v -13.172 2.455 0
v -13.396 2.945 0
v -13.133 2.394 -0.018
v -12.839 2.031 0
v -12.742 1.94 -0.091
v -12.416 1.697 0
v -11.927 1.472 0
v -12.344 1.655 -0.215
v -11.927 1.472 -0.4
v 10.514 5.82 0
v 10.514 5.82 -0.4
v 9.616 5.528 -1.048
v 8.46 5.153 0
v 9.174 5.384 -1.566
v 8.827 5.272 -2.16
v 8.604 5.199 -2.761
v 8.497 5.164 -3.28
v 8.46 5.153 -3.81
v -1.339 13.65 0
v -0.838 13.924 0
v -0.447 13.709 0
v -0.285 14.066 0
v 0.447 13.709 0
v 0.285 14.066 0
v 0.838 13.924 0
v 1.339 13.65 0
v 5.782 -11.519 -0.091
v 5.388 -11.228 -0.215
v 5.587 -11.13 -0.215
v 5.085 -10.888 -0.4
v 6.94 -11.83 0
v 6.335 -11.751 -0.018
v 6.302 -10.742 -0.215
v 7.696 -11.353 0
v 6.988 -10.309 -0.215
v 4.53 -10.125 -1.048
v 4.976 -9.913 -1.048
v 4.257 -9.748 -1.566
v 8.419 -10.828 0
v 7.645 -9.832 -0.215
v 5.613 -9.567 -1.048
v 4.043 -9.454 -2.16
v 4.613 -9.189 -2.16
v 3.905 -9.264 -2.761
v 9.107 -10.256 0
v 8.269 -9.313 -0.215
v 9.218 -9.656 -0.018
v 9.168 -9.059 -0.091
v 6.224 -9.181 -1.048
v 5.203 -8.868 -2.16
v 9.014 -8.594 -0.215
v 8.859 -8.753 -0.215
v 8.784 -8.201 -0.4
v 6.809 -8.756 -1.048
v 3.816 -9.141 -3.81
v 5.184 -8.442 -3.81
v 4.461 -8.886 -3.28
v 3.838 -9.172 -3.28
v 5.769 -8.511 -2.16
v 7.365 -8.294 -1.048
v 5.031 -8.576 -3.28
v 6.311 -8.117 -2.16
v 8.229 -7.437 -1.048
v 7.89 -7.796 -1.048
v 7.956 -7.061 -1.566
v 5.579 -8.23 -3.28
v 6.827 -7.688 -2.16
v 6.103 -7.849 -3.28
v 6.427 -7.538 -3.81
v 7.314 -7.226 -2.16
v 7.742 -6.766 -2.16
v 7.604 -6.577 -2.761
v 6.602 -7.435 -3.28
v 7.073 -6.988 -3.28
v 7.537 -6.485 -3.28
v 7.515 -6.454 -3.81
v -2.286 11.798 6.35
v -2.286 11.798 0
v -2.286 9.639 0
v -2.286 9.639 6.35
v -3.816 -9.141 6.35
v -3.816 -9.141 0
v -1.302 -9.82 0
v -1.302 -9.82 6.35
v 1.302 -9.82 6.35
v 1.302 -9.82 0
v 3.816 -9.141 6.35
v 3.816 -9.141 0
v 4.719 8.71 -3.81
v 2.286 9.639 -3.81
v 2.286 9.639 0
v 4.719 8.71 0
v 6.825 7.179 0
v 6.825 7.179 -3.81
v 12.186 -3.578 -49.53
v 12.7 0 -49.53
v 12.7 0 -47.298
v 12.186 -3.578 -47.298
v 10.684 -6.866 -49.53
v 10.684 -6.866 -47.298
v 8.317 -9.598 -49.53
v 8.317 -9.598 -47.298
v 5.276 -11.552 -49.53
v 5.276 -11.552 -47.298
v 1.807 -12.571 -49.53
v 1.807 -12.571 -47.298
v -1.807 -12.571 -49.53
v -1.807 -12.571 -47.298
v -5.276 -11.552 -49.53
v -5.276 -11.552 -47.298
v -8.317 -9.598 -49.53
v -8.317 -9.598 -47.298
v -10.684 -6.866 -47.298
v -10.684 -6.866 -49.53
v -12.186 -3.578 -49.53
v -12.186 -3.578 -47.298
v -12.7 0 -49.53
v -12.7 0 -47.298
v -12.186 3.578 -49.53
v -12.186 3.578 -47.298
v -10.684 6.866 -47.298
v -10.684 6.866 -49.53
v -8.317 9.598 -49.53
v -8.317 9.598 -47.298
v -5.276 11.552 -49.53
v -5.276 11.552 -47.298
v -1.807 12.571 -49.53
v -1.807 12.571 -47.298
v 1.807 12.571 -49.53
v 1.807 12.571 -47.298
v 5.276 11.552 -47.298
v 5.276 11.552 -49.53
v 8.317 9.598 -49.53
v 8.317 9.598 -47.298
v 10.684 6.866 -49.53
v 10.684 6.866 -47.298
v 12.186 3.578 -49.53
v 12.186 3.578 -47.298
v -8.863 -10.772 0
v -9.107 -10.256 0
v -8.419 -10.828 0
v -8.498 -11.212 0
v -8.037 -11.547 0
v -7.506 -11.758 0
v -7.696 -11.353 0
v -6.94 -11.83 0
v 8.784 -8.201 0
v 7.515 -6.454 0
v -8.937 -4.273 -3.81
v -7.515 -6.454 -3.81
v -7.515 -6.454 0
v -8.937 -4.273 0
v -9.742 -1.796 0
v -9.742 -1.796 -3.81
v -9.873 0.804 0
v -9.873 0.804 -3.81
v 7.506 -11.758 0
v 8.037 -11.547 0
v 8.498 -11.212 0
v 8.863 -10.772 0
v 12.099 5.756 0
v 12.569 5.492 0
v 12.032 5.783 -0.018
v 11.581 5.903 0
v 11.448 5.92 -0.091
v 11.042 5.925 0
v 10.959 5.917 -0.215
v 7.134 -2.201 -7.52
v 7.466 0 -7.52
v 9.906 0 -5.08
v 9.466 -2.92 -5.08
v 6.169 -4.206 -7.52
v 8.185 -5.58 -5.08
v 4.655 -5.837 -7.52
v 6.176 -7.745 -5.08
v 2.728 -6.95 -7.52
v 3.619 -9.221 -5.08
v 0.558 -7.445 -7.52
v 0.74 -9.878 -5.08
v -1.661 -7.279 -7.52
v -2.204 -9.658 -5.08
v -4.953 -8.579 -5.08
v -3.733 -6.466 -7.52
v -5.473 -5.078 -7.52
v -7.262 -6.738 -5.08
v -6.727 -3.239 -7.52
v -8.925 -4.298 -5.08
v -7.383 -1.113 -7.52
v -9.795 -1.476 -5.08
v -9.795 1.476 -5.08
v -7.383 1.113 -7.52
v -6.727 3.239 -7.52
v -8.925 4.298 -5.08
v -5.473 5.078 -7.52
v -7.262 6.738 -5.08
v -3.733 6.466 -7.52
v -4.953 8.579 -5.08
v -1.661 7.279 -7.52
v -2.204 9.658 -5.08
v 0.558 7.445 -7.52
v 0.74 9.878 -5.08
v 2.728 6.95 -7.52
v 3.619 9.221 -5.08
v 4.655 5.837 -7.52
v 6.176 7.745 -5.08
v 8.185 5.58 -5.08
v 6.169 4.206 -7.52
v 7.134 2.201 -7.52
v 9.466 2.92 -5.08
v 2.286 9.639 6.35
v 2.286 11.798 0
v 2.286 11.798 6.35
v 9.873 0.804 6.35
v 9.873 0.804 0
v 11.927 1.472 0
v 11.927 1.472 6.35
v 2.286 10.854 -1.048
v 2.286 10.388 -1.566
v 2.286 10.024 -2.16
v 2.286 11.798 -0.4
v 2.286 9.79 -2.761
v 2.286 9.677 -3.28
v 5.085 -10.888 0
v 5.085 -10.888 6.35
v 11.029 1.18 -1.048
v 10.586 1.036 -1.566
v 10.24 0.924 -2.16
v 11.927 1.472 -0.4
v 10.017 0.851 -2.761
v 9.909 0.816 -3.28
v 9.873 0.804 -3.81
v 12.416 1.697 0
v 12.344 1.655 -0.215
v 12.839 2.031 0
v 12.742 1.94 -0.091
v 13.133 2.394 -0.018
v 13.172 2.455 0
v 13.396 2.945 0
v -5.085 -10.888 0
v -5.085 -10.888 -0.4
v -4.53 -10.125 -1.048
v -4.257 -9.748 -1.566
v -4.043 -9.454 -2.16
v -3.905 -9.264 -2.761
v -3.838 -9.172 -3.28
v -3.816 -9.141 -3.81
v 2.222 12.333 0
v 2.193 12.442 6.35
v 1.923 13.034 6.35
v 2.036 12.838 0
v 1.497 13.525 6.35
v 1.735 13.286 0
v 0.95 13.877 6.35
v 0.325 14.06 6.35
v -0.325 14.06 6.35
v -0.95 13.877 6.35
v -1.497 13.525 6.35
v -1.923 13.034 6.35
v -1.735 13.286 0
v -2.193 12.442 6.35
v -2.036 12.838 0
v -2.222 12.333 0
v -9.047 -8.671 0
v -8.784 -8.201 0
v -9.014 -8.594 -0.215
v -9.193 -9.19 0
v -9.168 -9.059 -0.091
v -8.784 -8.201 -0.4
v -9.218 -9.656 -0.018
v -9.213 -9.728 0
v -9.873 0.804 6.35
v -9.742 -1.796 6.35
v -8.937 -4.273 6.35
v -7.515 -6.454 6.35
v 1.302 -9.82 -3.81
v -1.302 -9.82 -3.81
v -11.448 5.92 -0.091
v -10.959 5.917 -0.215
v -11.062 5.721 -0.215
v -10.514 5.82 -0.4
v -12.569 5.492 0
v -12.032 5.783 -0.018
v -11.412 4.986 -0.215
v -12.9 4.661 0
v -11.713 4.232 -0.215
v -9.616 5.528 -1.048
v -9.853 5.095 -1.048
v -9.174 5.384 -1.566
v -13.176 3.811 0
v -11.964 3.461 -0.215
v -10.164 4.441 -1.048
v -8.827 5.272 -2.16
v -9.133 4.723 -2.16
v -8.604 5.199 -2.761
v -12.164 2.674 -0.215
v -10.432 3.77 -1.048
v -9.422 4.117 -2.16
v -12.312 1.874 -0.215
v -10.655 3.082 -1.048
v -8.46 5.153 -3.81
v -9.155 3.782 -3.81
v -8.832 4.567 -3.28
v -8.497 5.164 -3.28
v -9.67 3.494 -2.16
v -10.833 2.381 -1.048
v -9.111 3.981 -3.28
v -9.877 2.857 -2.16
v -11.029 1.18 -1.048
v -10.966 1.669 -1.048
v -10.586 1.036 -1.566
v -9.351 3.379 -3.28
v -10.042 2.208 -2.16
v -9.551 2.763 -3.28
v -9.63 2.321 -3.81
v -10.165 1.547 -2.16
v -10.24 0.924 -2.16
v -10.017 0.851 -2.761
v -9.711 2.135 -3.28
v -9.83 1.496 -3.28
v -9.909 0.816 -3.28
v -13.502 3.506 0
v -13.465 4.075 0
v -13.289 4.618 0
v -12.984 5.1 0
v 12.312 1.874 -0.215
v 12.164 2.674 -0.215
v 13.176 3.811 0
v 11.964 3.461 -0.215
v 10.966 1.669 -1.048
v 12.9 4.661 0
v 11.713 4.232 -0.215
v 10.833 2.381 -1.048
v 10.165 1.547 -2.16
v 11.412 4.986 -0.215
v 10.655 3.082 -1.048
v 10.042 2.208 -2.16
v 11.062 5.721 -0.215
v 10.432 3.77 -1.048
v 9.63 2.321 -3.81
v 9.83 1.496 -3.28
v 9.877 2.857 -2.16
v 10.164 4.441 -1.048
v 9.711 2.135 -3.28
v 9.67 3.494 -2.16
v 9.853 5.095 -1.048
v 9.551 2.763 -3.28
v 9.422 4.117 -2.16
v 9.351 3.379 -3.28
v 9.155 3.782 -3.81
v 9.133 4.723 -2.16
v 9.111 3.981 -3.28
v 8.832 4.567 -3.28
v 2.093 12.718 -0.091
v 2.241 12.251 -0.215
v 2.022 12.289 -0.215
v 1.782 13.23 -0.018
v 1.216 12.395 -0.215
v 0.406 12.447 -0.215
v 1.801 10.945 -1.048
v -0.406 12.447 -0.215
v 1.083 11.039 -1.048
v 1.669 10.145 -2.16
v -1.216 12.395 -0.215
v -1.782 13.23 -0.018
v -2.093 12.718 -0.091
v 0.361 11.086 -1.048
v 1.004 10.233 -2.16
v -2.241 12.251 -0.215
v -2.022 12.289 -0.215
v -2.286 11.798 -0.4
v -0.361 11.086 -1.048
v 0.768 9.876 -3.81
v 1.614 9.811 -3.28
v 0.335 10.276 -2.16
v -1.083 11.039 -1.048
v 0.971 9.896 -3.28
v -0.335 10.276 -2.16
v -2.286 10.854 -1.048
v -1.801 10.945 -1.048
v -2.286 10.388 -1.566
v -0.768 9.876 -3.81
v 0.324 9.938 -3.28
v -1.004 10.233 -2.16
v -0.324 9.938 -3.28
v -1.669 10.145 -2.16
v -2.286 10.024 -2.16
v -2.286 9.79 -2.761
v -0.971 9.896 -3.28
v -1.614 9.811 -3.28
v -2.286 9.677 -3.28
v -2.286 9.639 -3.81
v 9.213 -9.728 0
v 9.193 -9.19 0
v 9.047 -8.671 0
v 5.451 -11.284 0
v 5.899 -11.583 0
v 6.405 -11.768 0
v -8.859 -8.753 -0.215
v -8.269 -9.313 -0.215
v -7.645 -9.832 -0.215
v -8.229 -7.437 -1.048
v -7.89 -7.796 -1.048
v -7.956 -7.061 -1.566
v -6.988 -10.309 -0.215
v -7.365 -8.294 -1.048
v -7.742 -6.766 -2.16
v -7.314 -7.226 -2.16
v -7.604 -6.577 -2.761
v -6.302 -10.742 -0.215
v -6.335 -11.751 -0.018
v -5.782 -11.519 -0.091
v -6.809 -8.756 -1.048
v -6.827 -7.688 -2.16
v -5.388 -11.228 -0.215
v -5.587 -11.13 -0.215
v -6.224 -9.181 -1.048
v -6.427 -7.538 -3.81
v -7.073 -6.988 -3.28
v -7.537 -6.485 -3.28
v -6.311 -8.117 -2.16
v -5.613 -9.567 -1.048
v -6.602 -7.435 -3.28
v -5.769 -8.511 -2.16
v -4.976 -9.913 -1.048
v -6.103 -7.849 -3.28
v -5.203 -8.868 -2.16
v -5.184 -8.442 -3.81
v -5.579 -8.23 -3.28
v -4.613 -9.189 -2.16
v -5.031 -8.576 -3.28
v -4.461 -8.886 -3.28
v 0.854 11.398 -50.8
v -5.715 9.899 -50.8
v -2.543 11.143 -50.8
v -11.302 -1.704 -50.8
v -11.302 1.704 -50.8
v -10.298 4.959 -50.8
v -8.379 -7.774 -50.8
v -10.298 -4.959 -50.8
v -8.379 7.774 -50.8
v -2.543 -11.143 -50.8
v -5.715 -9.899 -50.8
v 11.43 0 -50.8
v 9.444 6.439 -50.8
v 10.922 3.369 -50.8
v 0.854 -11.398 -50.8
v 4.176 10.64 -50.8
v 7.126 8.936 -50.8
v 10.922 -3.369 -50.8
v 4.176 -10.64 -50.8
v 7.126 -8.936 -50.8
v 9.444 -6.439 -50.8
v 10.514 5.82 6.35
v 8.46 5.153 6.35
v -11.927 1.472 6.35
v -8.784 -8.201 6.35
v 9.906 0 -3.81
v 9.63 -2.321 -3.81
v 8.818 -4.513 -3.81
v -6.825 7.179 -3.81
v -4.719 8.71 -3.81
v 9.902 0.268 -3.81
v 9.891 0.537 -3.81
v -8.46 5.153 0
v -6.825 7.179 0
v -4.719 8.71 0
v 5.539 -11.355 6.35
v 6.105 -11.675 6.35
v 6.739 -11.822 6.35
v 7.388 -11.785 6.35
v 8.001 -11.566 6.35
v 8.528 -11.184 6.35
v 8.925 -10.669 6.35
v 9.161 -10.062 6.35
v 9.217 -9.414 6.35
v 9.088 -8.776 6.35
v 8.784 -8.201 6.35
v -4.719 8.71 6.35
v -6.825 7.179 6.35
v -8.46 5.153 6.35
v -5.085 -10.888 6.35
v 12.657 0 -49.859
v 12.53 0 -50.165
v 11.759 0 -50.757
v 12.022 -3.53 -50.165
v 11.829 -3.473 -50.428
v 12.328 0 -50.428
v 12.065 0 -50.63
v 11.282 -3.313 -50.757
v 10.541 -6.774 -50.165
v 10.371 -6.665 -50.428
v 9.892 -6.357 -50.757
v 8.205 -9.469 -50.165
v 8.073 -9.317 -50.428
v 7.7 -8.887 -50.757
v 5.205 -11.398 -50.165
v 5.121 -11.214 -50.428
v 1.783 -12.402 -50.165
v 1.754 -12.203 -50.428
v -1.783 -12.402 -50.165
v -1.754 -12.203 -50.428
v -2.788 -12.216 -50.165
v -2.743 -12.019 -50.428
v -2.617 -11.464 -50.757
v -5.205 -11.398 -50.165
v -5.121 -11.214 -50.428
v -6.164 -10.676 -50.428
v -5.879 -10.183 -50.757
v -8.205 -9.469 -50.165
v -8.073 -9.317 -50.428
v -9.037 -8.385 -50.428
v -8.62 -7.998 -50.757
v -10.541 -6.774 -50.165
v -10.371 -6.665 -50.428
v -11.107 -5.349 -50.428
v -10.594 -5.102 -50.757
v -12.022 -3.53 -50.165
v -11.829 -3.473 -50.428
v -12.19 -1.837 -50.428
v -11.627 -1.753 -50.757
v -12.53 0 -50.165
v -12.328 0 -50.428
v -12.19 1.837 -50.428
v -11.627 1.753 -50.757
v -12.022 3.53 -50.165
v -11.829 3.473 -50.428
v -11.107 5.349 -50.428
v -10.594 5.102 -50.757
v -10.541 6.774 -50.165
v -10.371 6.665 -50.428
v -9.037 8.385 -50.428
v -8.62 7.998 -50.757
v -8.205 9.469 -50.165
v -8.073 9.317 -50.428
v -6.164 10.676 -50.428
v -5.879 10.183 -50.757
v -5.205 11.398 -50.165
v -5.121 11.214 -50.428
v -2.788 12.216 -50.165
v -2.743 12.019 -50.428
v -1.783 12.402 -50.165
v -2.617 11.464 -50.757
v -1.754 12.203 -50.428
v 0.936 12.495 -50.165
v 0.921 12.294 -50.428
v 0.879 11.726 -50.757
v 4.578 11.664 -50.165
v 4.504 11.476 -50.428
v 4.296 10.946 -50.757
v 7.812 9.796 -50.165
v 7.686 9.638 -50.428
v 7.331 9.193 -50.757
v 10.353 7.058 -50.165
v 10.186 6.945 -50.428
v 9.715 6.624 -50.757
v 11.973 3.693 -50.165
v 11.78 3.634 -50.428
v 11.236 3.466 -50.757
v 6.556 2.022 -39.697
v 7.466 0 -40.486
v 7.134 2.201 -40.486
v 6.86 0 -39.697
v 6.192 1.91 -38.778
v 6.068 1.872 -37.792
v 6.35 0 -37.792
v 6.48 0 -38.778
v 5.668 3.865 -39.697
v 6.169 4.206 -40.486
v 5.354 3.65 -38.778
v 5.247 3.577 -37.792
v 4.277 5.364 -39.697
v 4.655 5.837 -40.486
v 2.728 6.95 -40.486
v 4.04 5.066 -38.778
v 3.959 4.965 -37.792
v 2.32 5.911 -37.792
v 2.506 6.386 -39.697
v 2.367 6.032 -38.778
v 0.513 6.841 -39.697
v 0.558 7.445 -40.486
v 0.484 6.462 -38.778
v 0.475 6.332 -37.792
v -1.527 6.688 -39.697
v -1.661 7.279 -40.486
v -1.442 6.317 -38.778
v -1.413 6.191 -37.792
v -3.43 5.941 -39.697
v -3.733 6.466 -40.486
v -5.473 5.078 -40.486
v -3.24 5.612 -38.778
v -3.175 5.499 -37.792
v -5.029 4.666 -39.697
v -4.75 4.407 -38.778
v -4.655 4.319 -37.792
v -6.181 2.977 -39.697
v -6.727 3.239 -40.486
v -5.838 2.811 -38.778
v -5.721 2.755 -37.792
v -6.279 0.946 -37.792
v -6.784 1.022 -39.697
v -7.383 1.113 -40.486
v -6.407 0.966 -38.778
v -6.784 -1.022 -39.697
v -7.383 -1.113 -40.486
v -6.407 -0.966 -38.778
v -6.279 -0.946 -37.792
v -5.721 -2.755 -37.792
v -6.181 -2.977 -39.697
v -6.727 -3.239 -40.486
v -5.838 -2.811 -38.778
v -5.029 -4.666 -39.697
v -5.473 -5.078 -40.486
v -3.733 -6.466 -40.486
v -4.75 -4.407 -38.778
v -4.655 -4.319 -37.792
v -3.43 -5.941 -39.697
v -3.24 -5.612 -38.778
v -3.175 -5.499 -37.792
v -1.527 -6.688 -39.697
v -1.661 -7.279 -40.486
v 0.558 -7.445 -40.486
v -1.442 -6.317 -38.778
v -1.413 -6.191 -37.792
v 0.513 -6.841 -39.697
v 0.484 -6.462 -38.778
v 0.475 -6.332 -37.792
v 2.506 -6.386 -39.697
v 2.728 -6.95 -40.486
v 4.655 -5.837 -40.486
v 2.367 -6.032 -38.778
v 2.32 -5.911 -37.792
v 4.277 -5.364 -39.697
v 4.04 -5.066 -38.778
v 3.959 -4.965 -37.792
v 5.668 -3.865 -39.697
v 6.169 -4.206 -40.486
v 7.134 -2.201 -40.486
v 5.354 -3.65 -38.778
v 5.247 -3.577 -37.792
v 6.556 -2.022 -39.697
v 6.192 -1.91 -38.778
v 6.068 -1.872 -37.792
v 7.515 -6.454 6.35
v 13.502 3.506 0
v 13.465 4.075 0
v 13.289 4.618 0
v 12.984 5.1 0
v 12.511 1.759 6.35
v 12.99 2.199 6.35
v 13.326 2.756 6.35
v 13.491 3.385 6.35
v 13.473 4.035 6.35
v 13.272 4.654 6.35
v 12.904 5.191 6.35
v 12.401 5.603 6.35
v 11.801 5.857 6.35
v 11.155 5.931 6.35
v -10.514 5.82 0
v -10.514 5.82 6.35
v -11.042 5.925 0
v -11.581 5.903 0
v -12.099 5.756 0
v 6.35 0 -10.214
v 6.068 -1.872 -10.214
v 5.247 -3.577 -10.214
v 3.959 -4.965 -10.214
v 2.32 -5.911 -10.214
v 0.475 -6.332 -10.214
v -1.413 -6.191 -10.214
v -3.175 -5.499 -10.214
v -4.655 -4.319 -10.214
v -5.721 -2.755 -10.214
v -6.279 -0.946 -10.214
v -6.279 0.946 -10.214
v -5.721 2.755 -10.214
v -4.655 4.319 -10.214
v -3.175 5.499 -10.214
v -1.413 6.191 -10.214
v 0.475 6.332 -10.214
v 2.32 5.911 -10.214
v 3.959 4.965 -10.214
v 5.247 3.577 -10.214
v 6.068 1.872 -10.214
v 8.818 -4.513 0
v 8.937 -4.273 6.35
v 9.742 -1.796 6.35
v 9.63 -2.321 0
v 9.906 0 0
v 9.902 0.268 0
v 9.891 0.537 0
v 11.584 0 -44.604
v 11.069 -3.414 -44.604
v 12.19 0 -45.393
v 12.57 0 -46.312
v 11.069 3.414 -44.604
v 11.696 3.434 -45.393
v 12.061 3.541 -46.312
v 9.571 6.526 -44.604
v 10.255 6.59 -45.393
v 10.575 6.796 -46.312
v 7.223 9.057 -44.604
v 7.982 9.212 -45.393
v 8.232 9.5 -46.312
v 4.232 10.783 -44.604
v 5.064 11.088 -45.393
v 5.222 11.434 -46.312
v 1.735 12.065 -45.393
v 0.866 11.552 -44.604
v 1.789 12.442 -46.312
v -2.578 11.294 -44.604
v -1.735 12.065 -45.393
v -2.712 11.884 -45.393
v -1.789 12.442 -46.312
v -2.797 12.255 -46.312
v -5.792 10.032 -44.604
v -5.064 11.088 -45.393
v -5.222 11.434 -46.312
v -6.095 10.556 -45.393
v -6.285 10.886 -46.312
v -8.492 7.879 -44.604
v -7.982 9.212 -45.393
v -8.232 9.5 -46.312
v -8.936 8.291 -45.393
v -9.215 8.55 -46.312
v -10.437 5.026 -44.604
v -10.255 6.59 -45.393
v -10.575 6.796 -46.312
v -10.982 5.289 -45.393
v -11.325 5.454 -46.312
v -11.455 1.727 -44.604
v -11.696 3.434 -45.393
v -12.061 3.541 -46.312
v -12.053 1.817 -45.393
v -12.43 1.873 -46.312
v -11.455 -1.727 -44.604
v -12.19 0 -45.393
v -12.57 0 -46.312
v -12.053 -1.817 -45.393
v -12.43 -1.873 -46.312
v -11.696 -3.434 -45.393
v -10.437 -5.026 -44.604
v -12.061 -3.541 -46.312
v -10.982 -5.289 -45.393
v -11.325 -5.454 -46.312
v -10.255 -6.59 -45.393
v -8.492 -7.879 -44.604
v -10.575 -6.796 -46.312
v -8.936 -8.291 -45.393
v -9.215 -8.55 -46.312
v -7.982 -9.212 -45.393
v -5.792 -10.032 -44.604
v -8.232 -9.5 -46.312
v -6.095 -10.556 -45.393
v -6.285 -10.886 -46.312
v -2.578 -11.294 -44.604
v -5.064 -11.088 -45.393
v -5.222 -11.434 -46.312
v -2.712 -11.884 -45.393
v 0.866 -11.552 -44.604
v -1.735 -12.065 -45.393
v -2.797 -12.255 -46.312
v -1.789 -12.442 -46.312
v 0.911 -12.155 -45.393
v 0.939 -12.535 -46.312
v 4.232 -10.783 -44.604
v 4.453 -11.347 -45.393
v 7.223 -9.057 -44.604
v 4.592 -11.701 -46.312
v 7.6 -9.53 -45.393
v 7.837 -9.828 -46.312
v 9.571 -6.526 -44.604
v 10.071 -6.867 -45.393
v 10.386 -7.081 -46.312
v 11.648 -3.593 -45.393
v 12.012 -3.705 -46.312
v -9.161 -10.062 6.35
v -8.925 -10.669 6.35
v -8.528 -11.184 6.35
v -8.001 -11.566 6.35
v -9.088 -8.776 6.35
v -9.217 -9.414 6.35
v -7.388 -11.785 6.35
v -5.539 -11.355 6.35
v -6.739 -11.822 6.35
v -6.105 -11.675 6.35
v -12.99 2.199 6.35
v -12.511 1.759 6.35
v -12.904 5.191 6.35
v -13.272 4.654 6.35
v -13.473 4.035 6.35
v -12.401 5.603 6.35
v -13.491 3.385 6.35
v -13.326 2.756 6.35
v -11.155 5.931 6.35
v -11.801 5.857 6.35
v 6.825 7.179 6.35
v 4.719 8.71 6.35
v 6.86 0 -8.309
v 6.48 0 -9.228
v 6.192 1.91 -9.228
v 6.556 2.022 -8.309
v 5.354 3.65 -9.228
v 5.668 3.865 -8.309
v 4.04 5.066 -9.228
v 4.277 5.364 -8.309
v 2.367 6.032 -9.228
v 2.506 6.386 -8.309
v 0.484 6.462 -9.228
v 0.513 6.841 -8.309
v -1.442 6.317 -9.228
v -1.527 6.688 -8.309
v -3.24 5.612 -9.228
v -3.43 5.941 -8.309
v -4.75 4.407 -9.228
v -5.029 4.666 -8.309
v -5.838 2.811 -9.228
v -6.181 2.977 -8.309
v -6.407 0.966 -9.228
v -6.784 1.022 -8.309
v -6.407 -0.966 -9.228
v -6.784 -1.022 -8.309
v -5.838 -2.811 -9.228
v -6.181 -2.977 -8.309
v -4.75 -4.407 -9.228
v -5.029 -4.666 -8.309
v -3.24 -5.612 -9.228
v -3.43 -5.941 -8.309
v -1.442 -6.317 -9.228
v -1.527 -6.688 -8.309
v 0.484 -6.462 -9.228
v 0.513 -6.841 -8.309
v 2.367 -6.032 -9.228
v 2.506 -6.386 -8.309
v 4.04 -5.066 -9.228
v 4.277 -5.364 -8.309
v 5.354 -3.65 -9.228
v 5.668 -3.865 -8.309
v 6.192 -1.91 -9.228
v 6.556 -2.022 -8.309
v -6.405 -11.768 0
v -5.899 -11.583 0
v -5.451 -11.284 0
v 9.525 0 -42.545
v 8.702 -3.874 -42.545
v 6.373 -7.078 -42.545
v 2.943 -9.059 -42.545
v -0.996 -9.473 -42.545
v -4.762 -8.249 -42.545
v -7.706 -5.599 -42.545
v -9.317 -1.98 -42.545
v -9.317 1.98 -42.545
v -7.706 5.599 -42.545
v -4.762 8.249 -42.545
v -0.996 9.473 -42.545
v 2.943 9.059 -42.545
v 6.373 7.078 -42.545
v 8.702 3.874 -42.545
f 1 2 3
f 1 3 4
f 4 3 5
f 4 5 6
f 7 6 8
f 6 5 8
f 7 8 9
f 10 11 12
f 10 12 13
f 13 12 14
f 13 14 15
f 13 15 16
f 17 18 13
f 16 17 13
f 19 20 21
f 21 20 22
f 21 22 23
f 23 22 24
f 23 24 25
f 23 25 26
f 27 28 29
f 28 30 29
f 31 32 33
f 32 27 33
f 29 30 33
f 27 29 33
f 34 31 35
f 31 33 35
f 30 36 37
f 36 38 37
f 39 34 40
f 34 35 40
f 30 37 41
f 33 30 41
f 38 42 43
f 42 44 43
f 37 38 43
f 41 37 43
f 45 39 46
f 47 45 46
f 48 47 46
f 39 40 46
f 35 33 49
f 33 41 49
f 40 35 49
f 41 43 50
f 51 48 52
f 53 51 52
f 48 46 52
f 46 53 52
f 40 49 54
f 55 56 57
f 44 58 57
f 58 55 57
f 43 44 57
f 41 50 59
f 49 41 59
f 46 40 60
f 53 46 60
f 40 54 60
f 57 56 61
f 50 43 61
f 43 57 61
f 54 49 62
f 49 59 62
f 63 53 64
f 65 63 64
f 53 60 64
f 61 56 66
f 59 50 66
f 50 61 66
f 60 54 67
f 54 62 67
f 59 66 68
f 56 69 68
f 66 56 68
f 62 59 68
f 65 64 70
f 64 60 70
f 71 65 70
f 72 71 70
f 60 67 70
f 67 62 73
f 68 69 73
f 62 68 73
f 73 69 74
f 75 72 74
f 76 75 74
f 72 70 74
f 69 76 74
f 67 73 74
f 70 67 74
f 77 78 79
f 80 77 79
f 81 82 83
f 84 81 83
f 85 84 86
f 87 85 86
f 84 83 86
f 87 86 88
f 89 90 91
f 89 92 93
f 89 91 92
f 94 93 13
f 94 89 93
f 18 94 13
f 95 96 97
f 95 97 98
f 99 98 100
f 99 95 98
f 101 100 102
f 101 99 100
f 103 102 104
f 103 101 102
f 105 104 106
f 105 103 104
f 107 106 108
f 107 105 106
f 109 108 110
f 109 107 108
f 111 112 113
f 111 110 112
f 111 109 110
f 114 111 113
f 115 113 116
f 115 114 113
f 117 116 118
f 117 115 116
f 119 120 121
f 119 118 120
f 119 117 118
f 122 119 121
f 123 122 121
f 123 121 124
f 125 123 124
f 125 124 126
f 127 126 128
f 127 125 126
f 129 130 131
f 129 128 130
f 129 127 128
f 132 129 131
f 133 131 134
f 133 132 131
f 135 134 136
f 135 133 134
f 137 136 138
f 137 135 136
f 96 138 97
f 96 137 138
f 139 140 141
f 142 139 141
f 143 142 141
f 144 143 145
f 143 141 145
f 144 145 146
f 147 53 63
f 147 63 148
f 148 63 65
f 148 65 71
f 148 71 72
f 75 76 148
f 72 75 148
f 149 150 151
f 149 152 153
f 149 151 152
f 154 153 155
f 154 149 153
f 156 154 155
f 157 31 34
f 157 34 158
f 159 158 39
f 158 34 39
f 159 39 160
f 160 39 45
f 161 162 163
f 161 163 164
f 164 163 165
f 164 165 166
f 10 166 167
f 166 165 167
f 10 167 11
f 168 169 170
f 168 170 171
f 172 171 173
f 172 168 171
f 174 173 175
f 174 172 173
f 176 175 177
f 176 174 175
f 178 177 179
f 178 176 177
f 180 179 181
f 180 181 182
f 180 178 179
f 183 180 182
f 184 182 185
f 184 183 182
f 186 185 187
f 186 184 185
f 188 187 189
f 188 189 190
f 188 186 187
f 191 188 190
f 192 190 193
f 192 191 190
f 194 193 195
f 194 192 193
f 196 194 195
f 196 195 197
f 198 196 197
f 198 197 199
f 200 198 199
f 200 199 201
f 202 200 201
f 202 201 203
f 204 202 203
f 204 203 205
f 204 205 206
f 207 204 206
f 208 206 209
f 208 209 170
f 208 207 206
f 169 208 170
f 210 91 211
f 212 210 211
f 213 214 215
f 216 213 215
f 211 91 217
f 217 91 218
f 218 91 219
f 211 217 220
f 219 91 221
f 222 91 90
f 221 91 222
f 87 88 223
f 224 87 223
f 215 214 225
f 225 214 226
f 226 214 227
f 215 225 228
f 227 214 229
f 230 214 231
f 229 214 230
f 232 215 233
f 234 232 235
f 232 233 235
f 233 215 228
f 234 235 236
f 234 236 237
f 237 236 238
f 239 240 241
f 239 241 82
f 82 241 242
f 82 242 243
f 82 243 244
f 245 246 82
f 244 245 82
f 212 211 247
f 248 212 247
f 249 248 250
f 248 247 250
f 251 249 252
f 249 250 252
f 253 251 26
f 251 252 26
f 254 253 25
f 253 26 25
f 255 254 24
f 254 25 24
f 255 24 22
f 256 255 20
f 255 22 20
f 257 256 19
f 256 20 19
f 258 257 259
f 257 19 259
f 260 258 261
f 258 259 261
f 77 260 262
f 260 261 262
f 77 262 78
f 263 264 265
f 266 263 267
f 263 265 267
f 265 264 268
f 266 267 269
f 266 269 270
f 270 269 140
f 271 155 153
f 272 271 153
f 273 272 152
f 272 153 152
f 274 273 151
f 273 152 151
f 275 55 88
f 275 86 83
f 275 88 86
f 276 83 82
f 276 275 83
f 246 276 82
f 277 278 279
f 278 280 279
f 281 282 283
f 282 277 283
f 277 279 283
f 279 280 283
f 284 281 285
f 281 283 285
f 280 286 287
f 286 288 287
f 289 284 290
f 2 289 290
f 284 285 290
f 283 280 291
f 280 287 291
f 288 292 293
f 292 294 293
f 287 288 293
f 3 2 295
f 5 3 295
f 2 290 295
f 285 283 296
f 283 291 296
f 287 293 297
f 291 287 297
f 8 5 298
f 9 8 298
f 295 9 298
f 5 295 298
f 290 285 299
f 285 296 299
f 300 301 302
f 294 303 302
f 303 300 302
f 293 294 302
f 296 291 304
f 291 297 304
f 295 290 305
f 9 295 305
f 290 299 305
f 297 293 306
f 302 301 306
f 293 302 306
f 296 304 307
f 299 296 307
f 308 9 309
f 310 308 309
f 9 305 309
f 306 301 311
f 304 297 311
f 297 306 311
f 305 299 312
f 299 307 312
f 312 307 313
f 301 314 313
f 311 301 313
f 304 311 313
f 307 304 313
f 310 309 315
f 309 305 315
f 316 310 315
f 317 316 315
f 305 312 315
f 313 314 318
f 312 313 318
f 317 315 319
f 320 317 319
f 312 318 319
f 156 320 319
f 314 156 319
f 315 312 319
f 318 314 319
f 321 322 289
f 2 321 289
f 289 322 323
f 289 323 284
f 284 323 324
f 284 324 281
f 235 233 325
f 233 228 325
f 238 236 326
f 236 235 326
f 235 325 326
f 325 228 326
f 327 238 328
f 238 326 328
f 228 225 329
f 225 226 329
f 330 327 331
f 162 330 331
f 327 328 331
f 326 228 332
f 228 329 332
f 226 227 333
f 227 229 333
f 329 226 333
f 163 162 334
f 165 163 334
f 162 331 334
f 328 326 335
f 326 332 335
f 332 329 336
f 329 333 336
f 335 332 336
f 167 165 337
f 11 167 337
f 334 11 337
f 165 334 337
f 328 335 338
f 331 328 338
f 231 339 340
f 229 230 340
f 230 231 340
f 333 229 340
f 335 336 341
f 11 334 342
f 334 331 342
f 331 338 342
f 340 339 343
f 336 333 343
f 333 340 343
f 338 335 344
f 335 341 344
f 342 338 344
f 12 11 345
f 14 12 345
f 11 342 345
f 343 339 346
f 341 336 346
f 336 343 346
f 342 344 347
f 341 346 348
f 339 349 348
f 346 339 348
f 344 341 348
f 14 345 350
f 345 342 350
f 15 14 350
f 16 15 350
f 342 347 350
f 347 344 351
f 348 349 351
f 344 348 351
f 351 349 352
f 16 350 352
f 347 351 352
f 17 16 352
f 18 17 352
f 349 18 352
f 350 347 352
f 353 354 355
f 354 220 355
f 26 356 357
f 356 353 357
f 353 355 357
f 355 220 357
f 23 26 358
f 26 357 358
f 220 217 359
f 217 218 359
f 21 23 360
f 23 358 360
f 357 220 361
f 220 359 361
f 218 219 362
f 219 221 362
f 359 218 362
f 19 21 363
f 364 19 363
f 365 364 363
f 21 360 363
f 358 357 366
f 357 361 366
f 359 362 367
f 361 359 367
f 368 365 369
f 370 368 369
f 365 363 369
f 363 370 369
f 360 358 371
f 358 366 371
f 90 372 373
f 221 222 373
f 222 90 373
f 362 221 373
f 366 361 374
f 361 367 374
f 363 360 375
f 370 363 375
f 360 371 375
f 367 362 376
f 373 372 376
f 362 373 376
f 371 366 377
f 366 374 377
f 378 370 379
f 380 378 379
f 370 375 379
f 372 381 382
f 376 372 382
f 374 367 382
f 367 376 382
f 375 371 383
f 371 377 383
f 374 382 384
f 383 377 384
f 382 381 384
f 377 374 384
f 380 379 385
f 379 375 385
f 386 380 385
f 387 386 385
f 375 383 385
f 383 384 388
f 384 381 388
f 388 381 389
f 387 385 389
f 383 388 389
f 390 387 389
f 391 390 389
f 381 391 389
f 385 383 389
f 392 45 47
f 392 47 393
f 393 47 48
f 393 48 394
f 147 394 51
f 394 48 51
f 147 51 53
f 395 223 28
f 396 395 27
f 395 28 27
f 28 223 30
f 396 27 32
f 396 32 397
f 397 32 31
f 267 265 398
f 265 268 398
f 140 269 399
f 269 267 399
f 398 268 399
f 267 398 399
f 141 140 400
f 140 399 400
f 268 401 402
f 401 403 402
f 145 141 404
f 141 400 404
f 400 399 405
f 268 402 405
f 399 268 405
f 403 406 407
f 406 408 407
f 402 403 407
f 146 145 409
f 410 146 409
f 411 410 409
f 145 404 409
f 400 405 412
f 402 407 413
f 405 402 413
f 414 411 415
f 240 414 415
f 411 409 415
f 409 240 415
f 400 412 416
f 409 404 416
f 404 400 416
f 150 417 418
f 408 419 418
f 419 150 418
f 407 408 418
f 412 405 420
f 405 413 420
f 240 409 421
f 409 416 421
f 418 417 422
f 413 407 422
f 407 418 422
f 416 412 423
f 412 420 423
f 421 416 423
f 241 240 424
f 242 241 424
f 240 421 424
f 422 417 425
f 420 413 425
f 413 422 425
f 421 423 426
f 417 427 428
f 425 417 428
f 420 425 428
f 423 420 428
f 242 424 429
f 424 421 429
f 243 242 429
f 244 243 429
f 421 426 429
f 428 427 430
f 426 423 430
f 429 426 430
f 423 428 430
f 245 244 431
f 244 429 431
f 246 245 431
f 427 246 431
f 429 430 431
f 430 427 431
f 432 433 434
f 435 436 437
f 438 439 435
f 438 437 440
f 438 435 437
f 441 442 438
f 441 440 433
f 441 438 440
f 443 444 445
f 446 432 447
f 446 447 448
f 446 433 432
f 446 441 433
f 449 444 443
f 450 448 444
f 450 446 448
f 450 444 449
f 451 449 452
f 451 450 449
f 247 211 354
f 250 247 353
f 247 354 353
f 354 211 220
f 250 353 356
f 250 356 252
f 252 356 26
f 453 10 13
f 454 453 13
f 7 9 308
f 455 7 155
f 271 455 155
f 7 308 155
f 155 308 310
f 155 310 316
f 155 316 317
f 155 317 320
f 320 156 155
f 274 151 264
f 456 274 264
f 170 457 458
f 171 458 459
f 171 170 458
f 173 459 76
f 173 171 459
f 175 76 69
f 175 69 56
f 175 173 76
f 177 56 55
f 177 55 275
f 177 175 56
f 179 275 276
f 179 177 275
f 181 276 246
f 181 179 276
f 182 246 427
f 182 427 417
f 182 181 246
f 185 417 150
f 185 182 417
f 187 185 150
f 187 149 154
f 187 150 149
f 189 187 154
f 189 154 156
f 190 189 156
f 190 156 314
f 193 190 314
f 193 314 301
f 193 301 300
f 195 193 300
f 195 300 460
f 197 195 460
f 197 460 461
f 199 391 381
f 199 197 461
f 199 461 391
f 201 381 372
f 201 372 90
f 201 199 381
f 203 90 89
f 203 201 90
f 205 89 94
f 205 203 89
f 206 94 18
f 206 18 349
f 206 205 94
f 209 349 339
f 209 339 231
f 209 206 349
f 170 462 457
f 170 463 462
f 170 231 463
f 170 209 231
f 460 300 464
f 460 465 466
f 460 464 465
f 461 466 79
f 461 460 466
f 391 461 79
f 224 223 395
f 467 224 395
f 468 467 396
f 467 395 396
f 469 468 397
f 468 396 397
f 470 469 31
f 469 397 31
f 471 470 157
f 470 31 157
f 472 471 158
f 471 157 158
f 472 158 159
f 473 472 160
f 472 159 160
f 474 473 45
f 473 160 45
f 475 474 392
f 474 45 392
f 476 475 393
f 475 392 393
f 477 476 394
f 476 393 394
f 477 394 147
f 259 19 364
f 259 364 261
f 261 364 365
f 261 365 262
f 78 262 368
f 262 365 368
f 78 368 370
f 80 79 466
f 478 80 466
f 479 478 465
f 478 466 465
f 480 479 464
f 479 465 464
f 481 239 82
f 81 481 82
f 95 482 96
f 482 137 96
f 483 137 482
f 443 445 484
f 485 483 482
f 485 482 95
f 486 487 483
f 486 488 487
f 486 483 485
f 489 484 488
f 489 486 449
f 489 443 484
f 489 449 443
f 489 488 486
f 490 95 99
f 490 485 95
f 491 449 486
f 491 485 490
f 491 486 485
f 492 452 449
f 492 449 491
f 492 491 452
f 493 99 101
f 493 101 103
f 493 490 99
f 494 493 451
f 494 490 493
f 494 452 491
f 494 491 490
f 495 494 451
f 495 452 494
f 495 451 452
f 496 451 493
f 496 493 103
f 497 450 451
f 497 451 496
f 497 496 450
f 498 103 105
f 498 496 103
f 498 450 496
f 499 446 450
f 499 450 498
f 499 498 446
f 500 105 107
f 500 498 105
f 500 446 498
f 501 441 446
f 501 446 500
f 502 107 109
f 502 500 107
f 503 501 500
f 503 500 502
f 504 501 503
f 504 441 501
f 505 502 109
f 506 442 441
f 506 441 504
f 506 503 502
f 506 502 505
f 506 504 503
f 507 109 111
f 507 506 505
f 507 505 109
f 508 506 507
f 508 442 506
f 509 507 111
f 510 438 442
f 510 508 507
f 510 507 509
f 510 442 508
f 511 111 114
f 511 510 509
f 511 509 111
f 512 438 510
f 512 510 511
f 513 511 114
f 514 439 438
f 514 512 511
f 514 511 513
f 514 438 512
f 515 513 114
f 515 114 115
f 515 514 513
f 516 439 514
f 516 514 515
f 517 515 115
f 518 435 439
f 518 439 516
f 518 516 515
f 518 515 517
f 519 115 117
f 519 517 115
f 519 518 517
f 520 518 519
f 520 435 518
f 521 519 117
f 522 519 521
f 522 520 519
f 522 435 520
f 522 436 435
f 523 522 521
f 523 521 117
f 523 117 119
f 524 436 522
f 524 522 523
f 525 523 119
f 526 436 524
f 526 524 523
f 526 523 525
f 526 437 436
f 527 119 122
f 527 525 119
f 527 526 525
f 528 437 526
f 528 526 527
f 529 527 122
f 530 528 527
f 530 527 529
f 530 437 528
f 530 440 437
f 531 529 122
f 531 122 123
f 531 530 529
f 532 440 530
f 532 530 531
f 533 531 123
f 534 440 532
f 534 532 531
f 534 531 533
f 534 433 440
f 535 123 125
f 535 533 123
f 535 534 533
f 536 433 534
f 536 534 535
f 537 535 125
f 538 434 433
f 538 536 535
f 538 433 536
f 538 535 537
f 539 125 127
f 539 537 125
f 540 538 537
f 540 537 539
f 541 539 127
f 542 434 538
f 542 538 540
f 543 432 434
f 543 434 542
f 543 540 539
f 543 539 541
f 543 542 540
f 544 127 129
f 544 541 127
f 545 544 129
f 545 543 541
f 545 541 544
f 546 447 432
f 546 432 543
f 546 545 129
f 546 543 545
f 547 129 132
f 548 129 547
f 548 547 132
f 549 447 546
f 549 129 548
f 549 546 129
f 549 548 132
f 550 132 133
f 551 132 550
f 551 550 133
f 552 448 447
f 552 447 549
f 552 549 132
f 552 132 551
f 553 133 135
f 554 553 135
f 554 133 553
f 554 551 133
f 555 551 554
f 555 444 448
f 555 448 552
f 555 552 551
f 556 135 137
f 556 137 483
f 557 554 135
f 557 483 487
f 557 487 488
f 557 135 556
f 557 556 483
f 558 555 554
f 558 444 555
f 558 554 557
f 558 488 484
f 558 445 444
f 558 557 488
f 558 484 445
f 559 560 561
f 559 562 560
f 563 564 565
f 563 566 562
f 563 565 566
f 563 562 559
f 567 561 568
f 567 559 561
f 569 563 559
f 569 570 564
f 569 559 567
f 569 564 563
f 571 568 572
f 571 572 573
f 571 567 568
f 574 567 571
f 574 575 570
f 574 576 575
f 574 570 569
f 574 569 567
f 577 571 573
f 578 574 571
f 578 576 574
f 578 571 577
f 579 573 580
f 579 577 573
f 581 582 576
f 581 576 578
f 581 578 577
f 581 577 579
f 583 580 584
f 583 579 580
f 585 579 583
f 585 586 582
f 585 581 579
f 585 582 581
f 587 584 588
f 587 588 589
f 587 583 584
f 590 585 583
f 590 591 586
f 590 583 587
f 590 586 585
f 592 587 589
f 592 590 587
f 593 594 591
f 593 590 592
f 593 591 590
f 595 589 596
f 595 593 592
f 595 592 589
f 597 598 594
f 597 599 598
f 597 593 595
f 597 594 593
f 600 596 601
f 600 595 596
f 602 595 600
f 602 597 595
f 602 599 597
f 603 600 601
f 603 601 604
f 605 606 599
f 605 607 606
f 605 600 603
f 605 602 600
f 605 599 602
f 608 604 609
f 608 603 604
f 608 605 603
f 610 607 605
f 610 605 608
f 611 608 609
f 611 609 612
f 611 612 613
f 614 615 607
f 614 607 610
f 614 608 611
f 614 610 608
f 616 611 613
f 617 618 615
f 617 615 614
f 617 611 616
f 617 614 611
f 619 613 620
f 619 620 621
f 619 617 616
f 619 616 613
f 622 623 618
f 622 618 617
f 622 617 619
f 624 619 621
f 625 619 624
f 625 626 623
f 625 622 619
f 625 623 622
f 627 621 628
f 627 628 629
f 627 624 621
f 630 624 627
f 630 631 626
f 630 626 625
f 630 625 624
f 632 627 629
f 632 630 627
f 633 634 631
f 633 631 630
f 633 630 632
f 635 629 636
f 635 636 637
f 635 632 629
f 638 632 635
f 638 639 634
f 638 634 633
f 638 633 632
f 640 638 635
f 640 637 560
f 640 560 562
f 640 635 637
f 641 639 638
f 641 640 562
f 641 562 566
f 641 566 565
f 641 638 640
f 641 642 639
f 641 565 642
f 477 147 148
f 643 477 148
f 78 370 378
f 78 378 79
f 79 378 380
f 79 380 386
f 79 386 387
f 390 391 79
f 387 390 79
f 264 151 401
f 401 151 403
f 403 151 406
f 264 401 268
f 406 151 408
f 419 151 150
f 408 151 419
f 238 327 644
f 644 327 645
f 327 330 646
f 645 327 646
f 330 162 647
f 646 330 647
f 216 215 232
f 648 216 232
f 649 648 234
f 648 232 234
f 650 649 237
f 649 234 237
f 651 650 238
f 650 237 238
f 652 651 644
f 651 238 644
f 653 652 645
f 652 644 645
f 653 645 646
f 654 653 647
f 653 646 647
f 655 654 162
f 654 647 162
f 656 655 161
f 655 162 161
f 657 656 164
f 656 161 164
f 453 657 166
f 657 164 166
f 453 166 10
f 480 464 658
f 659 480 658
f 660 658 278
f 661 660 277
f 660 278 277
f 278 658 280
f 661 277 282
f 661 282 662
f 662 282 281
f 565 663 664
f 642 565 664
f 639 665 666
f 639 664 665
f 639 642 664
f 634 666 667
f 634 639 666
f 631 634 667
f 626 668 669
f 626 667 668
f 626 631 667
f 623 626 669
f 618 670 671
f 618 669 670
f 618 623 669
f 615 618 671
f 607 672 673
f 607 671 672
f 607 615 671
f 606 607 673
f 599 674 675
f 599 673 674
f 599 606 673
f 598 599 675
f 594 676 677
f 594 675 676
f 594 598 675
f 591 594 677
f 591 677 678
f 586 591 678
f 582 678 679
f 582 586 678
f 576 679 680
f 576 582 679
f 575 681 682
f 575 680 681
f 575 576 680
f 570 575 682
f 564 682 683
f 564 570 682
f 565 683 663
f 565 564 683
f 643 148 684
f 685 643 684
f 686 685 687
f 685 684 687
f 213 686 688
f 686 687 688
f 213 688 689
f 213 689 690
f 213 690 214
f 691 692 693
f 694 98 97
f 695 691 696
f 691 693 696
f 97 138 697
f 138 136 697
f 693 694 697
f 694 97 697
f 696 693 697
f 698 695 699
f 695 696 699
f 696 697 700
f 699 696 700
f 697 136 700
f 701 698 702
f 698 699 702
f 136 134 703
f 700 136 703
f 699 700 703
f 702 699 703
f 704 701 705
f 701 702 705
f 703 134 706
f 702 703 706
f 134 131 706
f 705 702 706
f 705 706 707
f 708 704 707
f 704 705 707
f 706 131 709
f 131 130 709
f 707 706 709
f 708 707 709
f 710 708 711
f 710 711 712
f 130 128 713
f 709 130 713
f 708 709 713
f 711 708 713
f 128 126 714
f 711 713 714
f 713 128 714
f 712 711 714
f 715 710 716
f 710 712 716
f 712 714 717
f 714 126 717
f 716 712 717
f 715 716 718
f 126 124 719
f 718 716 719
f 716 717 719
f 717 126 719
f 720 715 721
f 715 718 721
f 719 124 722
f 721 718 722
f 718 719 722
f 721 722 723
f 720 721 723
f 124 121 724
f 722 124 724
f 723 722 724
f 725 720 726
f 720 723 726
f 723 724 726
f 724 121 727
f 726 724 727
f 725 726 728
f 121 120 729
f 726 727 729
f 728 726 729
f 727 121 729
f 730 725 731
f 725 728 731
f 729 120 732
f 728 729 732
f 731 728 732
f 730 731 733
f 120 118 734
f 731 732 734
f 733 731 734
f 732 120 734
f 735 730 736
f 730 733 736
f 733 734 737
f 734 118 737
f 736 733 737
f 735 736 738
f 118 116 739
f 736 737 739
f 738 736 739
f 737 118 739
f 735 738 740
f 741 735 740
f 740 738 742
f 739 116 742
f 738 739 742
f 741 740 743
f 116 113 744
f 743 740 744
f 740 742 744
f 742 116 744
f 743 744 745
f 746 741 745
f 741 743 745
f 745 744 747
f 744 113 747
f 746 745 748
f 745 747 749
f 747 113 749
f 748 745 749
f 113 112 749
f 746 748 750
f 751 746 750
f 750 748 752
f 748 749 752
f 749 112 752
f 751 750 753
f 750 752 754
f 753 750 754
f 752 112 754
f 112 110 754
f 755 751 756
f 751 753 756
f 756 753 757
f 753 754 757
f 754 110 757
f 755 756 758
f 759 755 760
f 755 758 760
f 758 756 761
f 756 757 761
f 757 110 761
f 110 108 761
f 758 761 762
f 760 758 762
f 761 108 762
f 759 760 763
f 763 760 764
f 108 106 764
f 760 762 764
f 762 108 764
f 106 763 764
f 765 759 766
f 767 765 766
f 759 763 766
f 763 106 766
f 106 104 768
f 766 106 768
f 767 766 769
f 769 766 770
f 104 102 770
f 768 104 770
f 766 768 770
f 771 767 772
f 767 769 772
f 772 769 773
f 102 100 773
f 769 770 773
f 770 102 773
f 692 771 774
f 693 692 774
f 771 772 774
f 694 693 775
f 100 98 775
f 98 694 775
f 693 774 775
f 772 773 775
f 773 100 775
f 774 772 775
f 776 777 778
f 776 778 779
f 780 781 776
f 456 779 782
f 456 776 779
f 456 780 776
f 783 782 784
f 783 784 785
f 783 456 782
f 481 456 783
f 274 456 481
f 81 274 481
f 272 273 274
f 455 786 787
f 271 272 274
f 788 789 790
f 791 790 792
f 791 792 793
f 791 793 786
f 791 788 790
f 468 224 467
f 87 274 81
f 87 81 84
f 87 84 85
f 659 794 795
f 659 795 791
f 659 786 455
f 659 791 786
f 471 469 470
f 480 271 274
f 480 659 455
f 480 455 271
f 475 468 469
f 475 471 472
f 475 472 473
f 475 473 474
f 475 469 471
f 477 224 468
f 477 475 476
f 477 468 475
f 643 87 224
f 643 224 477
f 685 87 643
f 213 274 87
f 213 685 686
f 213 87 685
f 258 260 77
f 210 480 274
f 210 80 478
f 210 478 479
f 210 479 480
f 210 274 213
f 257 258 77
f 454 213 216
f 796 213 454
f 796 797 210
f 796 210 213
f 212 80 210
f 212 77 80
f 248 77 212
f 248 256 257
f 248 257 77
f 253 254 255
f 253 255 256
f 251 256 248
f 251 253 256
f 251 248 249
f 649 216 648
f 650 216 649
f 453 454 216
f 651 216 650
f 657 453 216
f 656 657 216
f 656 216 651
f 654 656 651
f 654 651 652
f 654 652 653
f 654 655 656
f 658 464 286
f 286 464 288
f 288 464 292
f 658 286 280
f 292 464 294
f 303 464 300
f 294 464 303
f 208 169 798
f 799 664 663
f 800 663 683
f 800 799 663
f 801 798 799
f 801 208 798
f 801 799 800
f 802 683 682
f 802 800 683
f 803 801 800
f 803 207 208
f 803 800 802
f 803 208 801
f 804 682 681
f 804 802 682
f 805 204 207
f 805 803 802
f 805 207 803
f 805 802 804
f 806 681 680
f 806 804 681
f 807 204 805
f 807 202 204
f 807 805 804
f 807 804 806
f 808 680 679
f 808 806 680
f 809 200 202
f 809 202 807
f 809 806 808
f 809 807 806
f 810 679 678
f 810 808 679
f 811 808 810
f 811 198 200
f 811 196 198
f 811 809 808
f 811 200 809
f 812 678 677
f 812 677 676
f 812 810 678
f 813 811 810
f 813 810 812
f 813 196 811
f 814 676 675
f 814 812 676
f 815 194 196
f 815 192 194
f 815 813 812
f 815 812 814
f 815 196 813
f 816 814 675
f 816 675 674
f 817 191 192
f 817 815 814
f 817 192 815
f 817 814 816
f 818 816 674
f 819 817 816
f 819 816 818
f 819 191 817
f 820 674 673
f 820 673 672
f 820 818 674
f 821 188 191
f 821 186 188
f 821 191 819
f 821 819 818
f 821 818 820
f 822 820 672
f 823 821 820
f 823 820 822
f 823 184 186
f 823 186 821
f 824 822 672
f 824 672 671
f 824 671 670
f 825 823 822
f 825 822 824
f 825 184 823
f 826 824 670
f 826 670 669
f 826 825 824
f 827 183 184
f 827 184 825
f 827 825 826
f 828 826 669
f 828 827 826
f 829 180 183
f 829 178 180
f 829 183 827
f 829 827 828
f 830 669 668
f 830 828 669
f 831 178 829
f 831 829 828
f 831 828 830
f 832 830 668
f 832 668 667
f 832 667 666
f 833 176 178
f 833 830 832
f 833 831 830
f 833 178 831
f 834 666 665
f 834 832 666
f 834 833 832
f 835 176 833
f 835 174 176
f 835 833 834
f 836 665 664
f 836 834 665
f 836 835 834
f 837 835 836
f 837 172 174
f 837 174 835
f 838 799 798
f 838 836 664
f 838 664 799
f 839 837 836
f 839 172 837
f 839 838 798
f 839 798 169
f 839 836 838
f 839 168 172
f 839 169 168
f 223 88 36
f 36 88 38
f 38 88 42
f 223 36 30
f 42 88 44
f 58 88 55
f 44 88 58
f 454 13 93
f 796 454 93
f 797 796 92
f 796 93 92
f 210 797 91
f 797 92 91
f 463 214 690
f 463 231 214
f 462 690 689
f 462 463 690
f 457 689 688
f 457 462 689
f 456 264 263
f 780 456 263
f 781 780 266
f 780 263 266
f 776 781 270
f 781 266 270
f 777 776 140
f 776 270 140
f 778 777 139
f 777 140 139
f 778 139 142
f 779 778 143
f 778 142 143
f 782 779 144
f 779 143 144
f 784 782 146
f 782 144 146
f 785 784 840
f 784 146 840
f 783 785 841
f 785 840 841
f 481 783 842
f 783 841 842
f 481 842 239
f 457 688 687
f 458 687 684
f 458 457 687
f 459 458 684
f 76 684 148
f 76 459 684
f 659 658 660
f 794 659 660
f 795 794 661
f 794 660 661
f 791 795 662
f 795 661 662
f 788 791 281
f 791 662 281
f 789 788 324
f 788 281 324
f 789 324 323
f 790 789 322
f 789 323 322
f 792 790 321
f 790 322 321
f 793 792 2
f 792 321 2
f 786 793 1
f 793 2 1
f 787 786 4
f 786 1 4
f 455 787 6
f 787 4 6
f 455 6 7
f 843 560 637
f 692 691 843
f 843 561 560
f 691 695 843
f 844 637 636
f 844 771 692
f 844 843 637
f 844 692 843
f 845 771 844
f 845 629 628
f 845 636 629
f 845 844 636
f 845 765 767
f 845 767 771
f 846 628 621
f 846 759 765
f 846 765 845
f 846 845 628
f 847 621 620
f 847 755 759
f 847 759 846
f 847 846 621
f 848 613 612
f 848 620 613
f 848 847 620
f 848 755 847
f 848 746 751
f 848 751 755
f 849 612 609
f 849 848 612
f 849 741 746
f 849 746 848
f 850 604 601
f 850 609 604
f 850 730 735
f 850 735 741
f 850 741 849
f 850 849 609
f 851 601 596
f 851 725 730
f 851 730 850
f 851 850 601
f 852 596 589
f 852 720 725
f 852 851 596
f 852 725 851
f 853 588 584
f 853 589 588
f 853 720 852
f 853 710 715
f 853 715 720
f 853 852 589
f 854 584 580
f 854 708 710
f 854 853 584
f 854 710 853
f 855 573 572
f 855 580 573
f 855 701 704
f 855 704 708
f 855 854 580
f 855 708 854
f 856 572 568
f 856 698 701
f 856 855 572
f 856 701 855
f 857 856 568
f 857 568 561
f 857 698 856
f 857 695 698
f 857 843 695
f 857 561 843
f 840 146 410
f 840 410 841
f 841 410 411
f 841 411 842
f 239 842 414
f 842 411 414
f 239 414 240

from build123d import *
from build123d.topology import SkipClean

# Parameters (mm, degrees)
SKETCH1_R           = 9.906
BOSS_EXTRUDE1_DEPTH = 6.35
FILLET1_START       = -3.8100001
FILLET1_3_DEPTH     = 3.8100001
FILLET2_R           = 1.27


with BuildPart() as part:
    # Sketch1 → Boss-Extrude1 (new body)
    with BuildSketch(Plane.XY):
        with BuildLine():
            ThreePointArc((-9.873287403, 0.804382899), (-9.42116585, 3.061122346), (-8.460461705, 5.152613292))
            Line((-8.460461705, 5.152613292), (-10.513792724, 5.819780983))
            ThreePointArc((-10.513792724, 5.819780983), (-13.394320769, 4.352078636), (-11.926618422, 1.47155059))
            Line((-11.926618422, 1.47155059), (-9.873287403, 0.804382899))
        make_face()
        Circle(SKETCH1_R)
        with BuildLine():
            Line((-5.085055556, -10.888154027), (-3.816027196, -9.141486336))
            ThreePointArc((-3.816027196, -9.141486336), (-5.822600709, -8.014122346), (-7.514852894, -6.454132163))
            Line((-7.514852894, -6.454132163), (-8.783881254, -8.200799854))
            ThreePointArc((-8.783881254, -8.200799854), (-8.278145492, -11.39388979), (-5.085055556, -10.888154027))
        make_face()
        with BuildLine():
            Line((8.783881254, -8.200799854), (7.514852894, -6.454132163))
            ThreePointArc((7.514852894, -6.454132163), (5.822600709, -8.014122346), (3.816027196, -9.141486336))
            Line((3.816027196, -9.141486336), (5.085055556, -10.888154027))
            ThreePointArc((5.085055556, -10.888154027), (8.278145492, -11.39388979), (8.783881254, -8.200799854))
        make_face()
        with BuildLine():
            Line((9.873287403, 0.804382899), (11.926618422, 1.47155059))
            ThreePointArc((11.926618422, 1.47155059), (13.394320769, 4.352078636), (10.513792724, 5.819780983))
            Line((10.513792724, 5.819780983), (8.460461705, 5.152613292))
            ThreePointArc((8.460461705, 5.152613292), (9.42116585, 3.061122346), (9.873287403, 0.804382899))
        make_face()
        with BuildLine():
            ThreePointArc((-2.286, 9.638622308), (0, 9.906), (2.286, 9.638622308))
            Line((2.286, 9.638622308), (2.286, 11.797622308))
            ThreePointArc((2.286, 11.797622308), (0, 14.083622308), (-2.286, 11.797622308))
            Line((-2.286, 11.797622308), (-2.286, 9.638622308))
        make_face()
    extrude(amount=BOSS_EXTRUDE1_DEPTH)

    # Sketch2 → Revolve1 (revolve)
    with SkipClean():  # the faces are left unmerged after this step: merging them gives an invalid solid
        with BuildSketch(Plane(origin=(0, 0, 0), x_dir=(1, 0, 0), z_dir=(0, 1, 0))):
            Polygon((0, 50.8), (0, 0), (9.906, 0), (9.906, 5.08), (6.35, 8.636), (6.35, 39.37), (12.7, 45.72), (12.7, 50.8), align=None)
        revolve(axis=Axis((0, 0, 0), (0, 0, -1)))
    add(part.part.scale(1), mode=Mode.REPLACE)  # the faces are merged on a copy

    # Fillet1: read off the stored shape, not the designer's step
    # Fillet1 outline → Fillet1 (revolve, cut)
    with BuildSketch(Plane.XZ):
        with BuildLine():
            Line((12.7, -44.604076836), (11.584076836, -44.604076836))
            ThreePointArc((11.584076836, -44.604076836), (12.409981019, -45.840129795), (12.7, -47.298153673))
            Line((12.7, -47.298153673), (12.7, -44.604076836))
        make_face()
    revolve(axis=Axis((0, 0, 0), (0, 0, 1)), mode=Mode.SUBTRACT)

    # Fillet1 2 outline → Fillet1 2 (revolve)
    with BuildSketch(Plane.XZ):
        with BuildLine():
            Line((6.35, -40.485923164), (7.465923164, -40.485923164))
            ThreePointArc((7.465923164, -40.485923164), (6.640018981, -39.249870205), (6.35, -37.791846327))
            Line((6.35, -37.791846327), (6.35, -40.485923164))
        make_face()
        with BuildLine():
            Line((6.35, -7.520076836), (6.35, -10.214153673))
            ThreePointArc((6.35, -10.214153673), (6.640018981, -8.756129795), (7.465923164, -7.520076836))
            Line((7.465923164, -7.520076836), (6.35, -7.520076836))
        make_face()
    revolve(axis=Axis((0, 0, 0), (0, 0, 1)))

    # Fillet1 3 outline → Fillet1 3 (add)
    with BuildSketch(Plane.XY.offset(FILLET1_START)):
        with BuildLine():
            Line((-11.926618422, 1.47155059), (-9.873287403, 0.804382899))
            ThreePointArc((-9.873287403, 0.804382899), (-9.42116585, 3.061122346), (-8.460461705, 5.152613292))
            Line((-8.460461705, 5.152613292), (-10.513792724, 5.819780983))
            ThreePointArc((-10.513792724, 5.819780983), (-13.394320769, 4.352078635), (-11.926618422, 1.47155059))
        make_face()
        with BuildLine():
            ThreePointArc((-3.816027196, -9.141486336), (-5.822600709, -8.014122346), (-7.514852894, -6.454132163))
            Line((-7.514852894, -6.454132163), (-8.783881254, -8.200799854))
            ThreePointArc((-8.783881254, -8.200799854), (-8.278145492, -11.39388979), (-5.085055556, -10.888154027))
            Line((-5.085055556, -10.888154027), (-3.816027196, -9.141486336))
        make_face()
        with BuildLine():
            Line((-2.286, 11.797622308), (-2.286, 9.638622308))
            ThreePointArc((-2.286, 9.638622308), (0, 9.906), (2.286, 9.638622308))
            Line((2.286, 9.638622308), (2.286, 11.797622308))
            ThreePointArc((2.286, 11.797622308), (0, 14.083622308), (-2.286, 11.797622308))
        make_face()
        with BuildLine():
            ThreePointArc((7.514852894, -6.454132163), (5.822600709, -8.014122346), (3.816027196, -9.141486336))
            Line((3.816027196, -9.141486336), (5.085055556, -10.888154027))
            ThreePointArc((5.085055556, -10.888154027), (8.278145492, -11.39388979), (8.783881254, -8.200799854))
            Line((8.783881254, -8.200799854), (7.514852894, -6.454132163))
        make_face()
        with BuildLine():
            Line((10.513792724, 5.819780983), (8.460461705, 5.152613292))
            ThreePointArc((8.460461705, 5.152613292), (9.42116585, 3.061122346), (9.873287403, 0.804382899))
            Line((9.873287403, 0.804382899), (11.926618422, 1.47155059))
            ThreePointArc((11.926618422, 1.47155059), (13.394320769, 4.352078635), (10.513792724, 5.819780983))
        make_face()
    extrude(amount=FILLET1_3_DEPTH)

    # Fillet1 4 outline → Fillet1 4 (revolve, cut)
    with BuildSketch(Plane.XZ):
        with BuildLine():
            Line((14.083622308, 0), (13.716, 0))
            ThreePointArc((13.716, 0), (11.021923164, -1.115923164), (9.906, -3.81))
            Line((9.906, -3.81), (14.083622308, -3.8100001))
            Line((14.083622308, -3.8100001), (14.083622308, 0))
        make_face()
    revolve(axis=Axis((0, 0, 0), (0, 0, 1)), mode=Mode.SUBTRACT)

    # Fillet2
    fillet2_edges = [part.edges().sort_by_distance(p)[0] for p in [
        (-12.7, 0, -50.8),
    ]]
    fillet(fillet2_edges, radius=FILLET2_R)


solid = part.part
